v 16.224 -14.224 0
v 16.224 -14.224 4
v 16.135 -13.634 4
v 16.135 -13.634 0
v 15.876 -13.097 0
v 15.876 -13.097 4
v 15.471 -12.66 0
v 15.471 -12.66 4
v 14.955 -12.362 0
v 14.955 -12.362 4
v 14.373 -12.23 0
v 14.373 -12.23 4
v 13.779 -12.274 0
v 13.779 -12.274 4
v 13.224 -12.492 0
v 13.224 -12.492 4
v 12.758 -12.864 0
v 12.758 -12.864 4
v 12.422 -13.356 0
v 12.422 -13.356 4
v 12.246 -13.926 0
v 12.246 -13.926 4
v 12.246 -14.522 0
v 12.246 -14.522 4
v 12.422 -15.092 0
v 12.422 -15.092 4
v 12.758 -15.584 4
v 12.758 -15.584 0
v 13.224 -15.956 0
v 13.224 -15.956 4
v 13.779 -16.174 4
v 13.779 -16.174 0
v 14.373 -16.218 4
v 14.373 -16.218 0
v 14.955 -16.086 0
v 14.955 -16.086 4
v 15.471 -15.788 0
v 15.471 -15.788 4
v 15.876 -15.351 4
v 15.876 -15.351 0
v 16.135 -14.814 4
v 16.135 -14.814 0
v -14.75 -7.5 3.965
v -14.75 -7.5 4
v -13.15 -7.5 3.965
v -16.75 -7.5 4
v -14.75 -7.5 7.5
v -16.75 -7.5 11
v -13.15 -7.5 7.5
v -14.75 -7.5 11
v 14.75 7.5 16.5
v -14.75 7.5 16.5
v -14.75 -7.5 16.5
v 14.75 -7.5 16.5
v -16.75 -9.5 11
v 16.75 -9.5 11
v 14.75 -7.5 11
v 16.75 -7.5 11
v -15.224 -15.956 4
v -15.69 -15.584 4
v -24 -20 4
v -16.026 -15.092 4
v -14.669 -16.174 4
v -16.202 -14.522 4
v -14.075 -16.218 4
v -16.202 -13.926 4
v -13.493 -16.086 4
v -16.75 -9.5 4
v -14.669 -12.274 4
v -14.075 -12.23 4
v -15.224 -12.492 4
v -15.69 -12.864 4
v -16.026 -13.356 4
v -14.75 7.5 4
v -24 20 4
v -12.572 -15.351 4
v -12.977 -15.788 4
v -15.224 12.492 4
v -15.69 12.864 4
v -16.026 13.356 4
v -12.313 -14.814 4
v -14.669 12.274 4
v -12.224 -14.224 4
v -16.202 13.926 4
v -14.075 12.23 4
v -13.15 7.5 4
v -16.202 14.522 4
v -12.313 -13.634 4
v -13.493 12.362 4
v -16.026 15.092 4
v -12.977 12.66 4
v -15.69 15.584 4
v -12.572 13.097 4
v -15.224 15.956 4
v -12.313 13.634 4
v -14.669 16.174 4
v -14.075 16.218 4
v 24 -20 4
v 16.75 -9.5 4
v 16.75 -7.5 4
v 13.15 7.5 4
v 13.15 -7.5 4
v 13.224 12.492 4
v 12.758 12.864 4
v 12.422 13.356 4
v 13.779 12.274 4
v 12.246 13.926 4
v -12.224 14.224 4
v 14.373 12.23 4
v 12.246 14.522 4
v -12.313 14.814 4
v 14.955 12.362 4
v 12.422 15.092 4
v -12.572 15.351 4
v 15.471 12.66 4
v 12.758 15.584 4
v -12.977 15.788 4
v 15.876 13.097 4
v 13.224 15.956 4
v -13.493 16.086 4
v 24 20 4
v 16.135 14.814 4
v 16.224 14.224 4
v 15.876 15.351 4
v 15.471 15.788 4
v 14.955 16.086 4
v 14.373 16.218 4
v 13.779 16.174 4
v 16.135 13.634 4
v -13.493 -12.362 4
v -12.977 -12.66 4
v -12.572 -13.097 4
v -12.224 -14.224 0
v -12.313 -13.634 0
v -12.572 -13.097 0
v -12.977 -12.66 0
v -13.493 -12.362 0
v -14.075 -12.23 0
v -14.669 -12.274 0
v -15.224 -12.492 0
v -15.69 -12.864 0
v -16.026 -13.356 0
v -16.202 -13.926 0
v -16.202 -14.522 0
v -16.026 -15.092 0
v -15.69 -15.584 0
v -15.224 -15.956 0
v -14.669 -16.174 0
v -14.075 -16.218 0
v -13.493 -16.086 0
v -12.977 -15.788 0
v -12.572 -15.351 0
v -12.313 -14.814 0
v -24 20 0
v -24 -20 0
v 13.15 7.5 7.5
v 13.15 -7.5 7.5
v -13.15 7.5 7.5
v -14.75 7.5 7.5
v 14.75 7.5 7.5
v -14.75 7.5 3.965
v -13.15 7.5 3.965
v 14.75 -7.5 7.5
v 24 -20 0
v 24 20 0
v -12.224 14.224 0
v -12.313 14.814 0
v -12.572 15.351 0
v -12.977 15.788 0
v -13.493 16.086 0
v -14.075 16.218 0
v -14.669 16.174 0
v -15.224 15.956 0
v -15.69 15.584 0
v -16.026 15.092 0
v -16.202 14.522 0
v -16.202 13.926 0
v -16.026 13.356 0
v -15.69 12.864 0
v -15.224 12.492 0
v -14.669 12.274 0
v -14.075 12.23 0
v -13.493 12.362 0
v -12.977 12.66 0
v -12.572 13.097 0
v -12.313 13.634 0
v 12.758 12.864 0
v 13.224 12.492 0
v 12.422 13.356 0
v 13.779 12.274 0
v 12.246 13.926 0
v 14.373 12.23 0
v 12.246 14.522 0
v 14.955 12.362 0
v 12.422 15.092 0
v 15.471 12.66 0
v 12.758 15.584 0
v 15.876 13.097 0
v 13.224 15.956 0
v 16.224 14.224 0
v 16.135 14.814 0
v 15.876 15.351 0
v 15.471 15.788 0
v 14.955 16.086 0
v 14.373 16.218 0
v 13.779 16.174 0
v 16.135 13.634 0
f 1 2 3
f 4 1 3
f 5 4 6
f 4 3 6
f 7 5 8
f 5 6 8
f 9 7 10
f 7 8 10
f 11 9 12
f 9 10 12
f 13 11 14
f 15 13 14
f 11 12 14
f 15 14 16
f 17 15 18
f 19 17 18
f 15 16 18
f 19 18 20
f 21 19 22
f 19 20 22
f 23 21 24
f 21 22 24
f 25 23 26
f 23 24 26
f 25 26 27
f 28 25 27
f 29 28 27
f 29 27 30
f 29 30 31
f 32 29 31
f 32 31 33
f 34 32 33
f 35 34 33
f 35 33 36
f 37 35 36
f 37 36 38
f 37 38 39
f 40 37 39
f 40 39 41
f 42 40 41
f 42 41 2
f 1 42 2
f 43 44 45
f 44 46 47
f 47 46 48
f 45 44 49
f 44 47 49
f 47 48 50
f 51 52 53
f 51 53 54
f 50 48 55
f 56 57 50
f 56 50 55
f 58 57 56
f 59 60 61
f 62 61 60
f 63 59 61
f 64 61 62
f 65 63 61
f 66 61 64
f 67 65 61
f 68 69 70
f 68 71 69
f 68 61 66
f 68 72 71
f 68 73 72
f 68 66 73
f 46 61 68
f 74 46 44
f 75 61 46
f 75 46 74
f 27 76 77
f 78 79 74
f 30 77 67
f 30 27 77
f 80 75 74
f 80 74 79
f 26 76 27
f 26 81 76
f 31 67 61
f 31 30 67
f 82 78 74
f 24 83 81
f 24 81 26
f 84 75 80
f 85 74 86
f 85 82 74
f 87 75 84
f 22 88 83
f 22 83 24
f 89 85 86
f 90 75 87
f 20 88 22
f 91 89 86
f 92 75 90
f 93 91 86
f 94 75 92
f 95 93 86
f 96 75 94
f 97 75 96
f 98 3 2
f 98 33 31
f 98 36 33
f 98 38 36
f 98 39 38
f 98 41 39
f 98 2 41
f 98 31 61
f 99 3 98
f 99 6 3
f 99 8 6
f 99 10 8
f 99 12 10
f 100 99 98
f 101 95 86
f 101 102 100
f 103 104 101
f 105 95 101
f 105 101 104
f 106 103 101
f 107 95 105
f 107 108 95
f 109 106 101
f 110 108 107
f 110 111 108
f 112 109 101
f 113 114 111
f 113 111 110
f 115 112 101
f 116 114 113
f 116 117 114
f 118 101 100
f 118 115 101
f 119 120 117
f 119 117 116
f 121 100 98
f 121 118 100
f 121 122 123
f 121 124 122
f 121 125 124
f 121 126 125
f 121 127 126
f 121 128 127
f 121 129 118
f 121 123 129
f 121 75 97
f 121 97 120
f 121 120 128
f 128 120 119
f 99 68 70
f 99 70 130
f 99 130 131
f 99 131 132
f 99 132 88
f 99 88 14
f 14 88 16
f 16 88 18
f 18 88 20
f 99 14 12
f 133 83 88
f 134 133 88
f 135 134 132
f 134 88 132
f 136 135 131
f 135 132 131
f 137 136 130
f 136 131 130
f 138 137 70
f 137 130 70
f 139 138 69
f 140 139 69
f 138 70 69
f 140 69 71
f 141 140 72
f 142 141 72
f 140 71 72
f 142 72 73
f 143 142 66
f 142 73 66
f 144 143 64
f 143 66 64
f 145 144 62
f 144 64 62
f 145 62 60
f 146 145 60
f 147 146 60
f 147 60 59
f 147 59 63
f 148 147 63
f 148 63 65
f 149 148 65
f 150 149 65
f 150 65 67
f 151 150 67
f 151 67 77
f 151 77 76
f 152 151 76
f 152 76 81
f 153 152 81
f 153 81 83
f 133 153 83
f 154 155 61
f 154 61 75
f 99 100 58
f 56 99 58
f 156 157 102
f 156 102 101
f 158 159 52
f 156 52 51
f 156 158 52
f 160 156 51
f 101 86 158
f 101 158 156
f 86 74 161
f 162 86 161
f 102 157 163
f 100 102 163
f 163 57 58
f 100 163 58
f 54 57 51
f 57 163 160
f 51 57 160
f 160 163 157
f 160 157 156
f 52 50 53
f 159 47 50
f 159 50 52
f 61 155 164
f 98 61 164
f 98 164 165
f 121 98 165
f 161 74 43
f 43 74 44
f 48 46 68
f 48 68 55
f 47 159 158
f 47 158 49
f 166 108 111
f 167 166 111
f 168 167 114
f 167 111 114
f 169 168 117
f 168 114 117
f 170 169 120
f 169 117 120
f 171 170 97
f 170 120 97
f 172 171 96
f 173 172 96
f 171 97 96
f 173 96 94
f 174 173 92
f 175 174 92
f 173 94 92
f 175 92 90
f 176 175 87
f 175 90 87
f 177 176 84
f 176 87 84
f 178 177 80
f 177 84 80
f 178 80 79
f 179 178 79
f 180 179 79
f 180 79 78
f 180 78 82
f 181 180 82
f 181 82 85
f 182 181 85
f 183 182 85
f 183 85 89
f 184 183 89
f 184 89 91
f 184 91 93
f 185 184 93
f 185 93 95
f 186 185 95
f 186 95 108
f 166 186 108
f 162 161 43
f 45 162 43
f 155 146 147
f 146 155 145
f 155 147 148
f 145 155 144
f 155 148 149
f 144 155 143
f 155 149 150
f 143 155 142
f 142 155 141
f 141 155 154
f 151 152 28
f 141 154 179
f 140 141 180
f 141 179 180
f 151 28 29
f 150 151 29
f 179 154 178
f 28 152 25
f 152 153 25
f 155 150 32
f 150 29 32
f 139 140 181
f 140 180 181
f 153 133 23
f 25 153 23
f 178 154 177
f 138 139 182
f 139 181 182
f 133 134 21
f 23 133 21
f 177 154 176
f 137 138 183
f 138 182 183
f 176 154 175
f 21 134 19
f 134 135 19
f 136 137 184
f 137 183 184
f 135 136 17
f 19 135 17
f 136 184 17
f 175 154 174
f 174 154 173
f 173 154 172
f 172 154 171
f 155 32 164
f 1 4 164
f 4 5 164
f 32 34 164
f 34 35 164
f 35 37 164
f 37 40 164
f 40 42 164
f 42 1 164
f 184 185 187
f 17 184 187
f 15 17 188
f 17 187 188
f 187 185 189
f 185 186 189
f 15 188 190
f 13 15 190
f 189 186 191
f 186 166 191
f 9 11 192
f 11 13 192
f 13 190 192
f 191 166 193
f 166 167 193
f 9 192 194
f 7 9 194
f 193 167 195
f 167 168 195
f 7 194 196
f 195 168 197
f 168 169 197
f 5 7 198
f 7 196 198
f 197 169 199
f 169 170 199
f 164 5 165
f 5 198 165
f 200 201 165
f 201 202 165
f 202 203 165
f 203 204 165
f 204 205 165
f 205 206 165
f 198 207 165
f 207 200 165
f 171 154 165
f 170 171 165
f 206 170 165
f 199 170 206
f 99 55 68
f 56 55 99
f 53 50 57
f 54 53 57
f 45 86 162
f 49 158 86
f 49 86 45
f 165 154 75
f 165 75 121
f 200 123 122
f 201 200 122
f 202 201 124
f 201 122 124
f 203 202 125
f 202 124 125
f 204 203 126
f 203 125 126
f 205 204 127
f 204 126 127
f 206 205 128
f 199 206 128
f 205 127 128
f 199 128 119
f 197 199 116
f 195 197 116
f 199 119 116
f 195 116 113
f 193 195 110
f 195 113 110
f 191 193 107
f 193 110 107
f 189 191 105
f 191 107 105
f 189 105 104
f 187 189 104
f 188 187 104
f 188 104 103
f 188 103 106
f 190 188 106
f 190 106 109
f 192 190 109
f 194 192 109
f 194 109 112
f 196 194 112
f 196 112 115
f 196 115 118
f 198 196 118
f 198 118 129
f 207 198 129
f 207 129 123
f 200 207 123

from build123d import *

# Parameters (mm, degrees)
F0_W      = 48
F0_H      = 40
F1_DEPTH  = 4
F2_R      = 2
F3_DEPTH  = 4.001
F4_W      = 29.5
F4_H      = 15
F5_DEPTH  = 12.5
F6_W      = 15
F6_H      = 0.034775
F6_H_2    = 3.5
F7_DEPTH  = 1.6
F8_W      = 15
F8_H      = 3.5
F9_DEPTH  = 1.6
F10_DEPTH = 1.6
F11_W     = 33.5
F11_H     = 7
F12_DEPTH = 2


with BuildPart() as f1:
    # F0 (on Top) → F1 (new body)
    with BuildSketch(Plane.XY):
        Rectangle(F0_W, F0_H)
    extrude(amount=F1_DEPTH)

    # F2 (on face) → F3 (cut, through all)
    with BuildSketch(Plane.XY.offset(4)):
        with Locations((-14.224, 14.224)):
            Circle(F2_R)
        with Locations((14.224, 14.224)):
            Circle(F2_R)
        with Locations((-14.224, -14.224)):
            Circle(F2_R)
        with Locations((14.224, -14.224)):
            Circle(F2_R)
    extrude(amount=-F3_DEPTH, mode=Mode.SUBTRACT)

    # F4 (on face) → F5 (join)
    with BuildSketch(Plane.XY.offset(4)):
        Rectangle(F4_W, F4_H)
    extrude(amount=F5_DEPTH)

    # F6 (on face) → F7 (cut)
    with BuildSketch(Plane(origin=(-14.75, 0, 0), x_dir=(0, -1, 0), z_dir=(-1, 0, 0))):
        with Locations((0, 3.982613)):
            Rectangle(F6_W, F6_H)
        with Locations((0, 5.75)):
            Rectangle(F6_W, F6_H_2)
    extrude(amount=-F7_DEPTH, mode=Mode.SUBTRACT)

    # F8 (on face) → F9 (cut)
    with BuildSketch(Plane.YZ.offset(14.75)):
        with Locations((0, 5.75)):
            Rectangle(F8_W, F8_H)
    extrude(amount=-F9_DEPTH, mode=Mode.SUBTRACT)

    # F6 (on face) → F10 (cut)
    with BuildSketch(Plane(origin=(-14.75, 0, 0), x_dir=(0, -1, 0), z_dir=(-1, 0, 0))):
        with Locations((0, 3.982613)):
            Rectangle(F6_W, F6_H)
        with Locations((0, 5.75)):
            Rectangle(F6_W, F6_H_2)
    extrude(amount=-F10_DEPTH, mode=Mode.SUBTRACT)

    # F11 (on face) → F12 (join)
    with BuildSketch(Plane.XZ.offset(7.5)):
        with Locations((0, 7.5)):
            Rectangle(F11_W, F11_H)
    extrude(amount=F12_DEPTH)


solid = f1.part
